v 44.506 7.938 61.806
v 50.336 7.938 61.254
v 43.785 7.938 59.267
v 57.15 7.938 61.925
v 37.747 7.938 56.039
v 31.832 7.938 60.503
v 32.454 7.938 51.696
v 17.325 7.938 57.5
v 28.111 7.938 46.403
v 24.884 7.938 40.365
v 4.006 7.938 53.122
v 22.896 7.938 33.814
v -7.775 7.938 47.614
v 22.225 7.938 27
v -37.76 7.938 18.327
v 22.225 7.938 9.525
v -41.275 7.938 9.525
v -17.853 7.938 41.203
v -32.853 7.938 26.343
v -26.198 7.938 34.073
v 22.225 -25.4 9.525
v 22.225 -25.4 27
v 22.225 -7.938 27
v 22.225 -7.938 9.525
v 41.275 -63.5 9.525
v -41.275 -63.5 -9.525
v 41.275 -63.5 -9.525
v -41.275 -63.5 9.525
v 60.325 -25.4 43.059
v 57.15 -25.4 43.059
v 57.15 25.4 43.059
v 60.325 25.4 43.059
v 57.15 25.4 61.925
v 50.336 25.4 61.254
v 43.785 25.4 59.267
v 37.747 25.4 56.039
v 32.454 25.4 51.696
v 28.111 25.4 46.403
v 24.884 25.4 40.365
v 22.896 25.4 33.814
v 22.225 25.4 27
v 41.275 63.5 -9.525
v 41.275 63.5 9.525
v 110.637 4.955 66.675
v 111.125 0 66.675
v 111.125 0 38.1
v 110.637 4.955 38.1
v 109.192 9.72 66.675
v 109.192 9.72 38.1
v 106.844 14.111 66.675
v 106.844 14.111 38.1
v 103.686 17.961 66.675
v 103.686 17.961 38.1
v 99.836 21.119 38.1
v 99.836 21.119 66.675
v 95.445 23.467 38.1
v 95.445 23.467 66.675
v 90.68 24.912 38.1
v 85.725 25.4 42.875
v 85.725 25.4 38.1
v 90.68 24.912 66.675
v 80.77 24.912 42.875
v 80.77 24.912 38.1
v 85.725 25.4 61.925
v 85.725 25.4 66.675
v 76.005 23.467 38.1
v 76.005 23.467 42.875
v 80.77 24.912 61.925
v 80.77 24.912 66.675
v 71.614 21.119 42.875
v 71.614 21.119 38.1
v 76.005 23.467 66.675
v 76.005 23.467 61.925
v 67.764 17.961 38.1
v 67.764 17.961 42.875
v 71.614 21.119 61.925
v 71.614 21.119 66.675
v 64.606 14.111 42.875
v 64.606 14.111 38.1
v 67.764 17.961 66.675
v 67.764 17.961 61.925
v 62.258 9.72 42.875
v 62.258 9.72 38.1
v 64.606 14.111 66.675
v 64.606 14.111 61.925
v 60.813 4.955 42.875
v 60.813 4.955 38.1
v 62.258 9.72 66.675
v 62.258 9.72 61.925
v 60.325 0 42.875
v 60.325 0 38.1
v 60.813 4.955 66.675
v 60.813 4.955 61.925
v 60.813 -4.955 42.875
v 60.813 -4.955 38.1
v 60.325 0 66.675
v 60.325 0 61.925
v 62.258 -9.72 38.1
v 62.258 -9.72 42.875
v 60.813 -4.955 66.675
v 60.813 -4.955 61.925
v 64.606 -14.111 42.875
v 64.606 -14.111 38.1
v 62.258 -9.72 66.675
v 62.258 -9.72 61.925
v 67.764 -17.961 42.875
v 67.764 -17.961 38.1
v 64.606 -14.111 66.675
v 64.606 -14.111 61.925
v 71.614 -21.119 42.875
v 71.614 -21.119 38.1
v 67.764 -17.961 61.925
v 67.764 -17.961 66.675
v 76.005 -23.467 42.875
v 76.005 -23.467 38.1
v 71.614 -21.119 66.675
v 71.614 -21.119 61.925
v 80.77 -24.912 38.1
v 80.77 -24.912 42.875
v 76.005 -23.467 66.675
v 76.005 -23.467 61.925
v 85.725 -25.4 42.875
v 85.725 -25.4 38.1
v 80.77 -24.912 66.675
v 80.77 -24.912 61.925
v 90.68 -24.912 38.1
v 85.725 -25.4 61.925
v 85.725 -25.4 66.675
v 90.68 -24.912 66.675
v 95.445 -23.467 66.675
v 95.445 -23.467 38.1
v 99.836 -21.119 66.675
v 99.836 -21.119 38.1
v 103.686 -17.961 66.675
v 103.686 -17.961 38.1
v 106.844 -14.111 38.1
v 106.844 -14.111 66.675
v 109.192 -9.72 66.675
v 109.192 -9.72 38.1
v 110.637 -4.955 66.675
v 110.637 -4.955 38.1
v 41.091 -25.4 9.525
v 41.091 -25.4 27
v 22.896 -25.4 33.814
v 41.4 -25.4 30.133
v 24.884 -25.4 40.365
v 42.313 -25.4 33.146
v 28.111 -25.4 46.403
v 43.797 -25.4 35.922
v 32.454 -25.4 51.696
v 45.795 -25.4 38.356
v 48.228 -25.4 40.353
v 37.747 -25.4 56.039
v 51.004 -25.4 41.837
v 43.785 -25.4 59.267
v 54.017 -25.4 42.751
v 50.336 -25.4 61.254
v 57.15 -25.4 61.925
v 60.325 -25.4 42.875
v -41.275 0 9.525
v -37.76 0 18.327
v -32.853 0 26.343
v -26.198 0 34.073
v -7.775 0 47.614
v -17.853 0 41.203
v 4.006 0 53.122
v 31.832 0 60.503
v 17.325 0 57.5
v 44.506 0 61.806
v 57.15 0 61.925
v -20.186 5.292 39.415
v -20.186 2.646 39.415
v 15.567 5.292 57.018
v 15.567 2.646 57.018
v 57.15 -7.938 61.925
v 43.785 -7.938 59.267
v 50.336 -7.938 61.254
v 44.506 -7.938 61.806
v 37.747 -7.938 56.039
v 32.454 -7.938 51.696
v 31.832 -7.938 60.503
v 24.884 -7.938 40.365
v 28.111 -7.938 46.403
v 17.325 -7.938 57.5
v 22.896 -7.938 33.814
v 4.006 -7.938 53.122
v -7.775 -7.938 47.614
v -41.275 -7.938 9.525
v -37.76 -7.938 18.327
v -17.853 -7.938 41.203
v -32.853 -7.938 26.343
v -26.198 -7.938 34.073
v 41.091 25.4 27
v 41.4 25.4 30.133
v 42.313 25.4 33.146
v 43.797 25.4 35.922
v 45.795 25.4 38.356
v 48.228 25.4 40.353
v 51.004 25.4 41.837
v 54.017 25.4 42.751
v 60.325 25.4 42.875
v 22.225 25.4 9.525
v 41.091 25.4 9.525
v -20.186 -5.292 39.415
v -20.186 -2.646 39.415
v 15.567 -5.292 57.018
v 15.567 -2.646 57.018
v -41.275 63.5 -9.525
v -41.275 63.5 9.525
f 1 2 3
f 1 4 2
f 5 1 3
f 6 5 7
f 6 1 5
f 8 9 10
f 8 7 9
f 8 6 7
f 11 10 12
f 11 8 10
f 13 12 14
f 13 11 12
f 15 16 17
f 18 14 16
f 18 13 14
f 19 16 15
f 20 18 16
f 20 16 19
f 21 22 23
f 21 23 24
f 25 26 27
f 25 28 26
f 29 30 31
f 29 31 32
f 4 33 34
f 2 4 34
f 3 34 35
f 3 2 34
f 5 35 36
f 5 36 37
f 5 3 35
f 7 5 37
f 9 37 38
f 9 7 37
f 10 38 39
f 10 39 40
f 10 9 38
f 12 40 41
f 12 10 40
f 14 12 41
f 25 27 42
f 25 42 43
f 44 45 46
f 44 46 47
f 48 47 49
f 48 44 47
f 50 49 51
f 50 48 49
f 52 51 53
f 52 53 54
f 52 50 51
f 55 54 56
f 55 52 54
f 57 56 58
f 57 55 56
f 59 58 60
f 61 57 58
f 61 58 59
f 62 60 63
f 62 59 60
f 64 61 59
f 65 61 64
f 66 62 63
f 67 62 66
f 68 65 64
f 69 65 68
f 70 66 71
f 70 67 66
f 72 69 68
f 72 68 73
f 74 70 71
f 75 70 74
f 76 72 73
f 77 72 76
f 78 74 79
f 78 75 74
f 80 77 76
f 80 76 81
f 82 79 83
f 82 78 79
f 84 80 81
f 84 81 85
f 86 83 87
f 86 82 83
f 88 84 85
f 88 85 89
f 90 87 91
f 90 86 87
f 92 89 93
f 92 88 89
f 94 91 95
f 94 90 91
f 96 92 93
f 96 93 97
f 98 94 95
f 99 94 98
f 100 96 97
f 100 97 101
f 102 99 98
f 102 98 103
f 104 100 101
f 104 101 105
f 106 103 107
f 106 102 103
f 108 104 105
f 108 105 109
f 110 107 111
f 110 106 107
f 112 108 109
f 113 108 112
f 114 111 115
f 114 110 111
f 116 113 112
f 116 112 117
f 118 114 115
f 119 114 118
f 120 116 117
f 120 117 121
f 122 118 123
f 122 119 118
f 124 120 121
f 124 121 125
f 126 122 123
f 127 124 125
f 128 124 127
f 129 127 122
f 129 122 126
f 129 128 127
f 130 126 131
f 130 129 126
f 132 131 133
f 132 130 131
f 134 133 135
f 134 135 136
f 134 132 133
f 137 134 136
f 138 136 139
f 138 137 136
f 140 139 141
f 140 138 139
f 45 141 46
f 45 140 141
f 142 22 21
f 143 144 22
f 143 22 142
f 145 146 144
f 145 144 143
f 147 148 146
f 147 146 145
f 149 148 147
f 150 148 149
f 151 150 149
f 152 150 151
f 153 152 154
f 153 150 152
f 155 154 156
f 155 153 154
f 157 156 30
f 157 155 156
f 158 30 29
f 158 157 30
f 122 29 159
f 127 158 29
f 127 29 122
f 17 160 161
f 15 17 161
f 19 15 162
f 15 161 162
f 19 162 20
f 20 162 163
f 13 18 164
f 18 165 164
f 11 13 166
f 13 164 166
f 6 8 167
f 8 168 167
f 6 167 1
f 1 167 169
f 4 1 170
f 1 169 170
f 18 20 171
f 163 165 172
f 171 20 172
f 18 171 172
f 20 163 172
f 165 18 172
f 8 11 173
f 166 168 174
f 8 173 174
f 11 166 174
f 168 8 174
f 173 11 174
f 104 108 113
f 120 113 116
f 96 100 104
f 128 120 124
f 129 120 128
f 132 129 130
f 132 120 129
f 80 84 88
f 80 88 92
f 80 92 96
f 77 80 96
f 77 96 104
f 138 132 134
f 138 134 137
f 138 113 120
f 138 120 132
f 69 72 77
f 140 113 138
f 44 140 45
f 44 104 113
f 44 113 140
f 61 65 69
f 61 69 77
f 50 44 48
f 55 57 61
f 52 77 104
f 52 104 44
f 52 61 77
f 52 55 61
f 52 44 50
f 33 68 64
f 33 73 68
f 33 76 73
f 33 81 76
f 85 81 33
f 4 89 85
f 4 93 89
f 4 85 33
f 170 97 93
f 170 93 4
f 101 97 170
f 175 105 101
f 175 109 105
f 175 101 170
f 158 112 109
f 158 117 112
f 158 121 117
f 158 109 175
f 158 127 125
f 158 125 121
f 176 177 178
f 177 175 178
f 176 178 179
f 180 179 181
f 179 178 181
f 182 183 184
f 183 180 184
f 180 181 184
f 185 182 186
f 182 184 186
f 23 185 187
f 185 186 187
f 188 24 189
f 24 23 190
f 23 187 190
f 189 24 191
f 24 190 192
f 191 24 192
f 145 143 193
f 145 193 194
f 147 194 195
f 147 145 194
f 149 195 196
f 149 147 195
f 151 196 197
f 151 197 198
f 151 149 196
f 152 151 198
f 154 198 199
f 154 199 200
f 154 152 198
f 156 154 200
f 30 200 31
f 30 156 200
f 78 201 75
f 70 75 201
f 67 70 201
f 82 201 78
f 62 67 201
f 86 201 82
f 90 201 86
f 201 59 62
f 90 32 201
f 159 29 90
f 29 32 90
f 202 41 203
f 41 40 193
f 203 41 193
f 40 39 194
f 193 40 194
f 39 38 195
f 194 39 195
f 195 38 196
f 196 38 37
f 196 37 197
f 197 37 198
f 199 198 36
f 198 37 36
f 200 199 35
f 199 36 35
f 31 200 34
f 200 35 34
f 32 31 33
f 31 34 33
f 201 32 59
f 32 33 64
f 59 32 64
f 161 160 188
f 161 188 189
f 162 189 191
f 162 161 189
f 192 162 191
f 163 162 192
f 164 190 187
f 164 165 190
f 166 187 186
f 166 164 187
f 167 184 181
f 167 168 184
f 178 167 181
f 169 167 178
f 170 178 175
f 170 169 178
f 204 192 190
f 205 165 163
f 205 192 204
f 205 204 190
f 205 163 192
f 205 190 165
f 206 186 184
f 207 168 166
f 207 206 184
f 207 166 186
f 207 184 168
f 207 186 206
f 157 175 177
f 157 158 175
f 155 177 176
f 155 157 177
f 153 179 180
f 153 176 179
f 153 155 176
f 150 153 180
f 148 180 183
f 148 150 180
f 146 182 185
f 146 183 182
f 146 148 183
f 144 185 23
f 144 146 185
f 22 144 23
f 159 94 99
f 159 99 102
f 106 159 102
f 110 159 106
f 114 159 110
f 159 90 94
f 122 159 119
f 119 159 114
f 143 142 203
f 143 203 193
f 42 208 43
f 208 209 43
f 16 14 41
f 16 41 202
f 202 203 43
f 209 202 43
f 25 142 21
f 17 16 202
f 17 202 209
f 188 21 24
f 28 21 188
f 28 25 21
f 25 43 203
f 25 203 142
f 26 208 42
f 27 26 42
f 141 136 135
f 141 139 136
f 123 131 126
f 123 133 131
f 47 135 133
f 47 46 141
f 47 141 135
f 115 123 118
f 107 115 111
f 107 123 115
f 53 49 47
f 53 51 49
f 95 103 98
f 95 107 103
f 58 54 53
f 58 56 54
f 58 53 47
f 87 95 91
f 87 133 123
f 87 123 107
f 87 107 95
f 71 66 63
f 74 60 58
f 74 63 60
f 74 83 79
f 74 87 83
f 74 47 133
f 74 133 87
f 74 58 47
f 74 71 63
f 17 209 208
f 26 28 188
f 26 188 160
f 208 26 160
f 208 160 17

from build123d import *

# Parameters (mm, degrees)
F1_DEPTH = 63.5
F2_DEPTH = 25.4
F3_DEPTH = 7.9375


with BuildPart() as f1:
    # F0 (on Front) → F1 (new body, symmetric)
    with BuildSketch(Plane.XZ):
        Polygon((-41.275, -9.525), (41.275, -9.525), (41.275, 9.525), (41.0909965214, 9.525), (22.225, 9.525), (-41.275, 9.525), align=None)
    extrude(amount=F1_DEPTH, both=True)

    # F0 (on Front) → F2 (join, symmetric)
    with BuildSketch(Plane.XZ):
        with BuildLine():
            Line((22.225, 9.525), (41.0909965214, 9.525))
            Line((41.0909965214, 9.525), (41.0909965214, 27.0002))
            ThreePointArc((41.0909965214, 27.0002), (45.7945697412, 38.3556302588), (57.15, 43.0592034786))
            Line((57.15, 43.0592034786), (60.325, 43.0592034786))
            Line((60.325, 43.0592034786), (60.325, 61.9252))
            Line((60.325, 61.9252), (57.15, 61.9252))
            ThreePointArc((57.15, 61.9252), (32.4542956671, 51.6959043329), (22.225, 27.0002))
            Line((22.225, 27.0002), (22.225, 9.525))
        make_face()
        Polygon((85.725, 61.9252), (60.325, 61.9252), (60.325, 43.0592034786), (60.325, 42.8752), (85.725, 42.8752), align=None)
    extrude(amount=F2_DEPTH, both=True)

    # F0 (on Front) → F3 (join, symmetric)
    with BuildSketch(Plane.XZ):
        with BuildLine():
            add(Edge.make_bspline(
                [(-41.275, 9.525), (-30.462404713, 45.4226024449), (15.5969550833, 63.5012462735), (57.15, 61.9252)],
                knots=[0, 0, 0, 0, 111.5045361635, 111.5045361635, 111.5045361635, 111.5045361635], degree=3))
            Line((-41.275, 9.525), (22.225, 9.525))
            Line((22.225, 9.525), (22.225, 27.0002))
            ThreePointArc((22.225, 27.0002), (32.4542956671, 51.6959043329), (57.15, 61.9252))
        make_face()
    extrude(amount=F3_DEPTH, both=True)

    # F0 (on Front) → F4 (revolve)
    with BuildSketch(Plane.XZ):
        Polygon((85.725, 66.675), (85.725, 61.9252), (85.725, 42.8752), (85.725, 38.1), (111.125, 38.1), (111.125, 66.675), align=None)
    revolve(axis=Axis((85.725, 0, 52.3875), (0, 0, 1)))


solid = f1.part
